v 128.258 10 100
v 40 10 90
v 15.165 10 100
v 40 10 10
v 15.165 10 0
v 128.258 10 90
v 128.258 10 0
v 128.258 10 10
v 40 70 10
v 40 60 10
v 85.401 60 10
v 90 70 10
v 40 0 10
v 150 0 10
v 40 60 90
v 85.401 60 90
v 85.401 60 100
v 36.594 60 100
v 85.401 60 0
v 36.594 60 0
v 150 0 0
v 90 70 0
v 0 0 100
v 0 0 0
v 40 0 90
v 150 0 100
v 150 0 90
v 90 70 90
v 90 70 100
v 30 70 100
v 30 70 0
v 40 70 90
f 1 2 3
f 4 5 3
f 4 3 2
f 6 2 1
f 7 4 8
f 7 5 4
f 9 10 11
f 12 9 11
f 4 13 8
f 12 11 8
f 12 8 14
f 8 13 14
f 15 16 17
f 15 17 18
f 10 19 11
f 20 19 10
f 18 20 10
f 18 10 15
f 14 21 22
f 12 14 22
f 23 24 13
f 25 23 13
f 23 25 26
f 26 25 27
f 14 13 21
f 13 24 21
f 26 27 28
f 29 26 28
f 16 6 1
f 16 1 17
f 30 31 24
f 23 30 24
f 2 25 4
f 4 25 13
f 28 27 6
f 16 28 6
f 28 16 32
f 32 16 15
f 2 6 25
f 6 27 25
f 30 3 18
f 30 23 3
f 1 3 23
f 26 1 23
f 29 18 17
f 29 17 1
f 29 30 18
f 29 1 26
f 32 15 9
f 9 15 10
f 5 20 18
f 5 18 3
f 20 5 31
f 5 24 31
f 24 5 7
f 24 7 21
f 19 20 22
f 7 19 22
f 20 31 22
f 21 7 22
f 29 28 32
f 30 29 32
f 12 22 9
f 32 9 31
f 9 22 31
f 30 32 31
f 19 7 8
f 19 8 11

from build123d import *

# Parameters (mm, degrees)
BOSS_EXTRUDE2_DEPTH          = 100
CUT_EXTRUDE_THIN5_DEPTH      = 194.390796058
CUT_EXTRUDE_THIN5_DEPTH_BACK = 100


with BuildPart() as part:
    # Sketch1 → Boss-Extrude2 (new body)
    with BuildSketch(Plane.XY):
        Polygon((0, 0), (150, 0), (90, 70), (30, 70), align=None)
        Polygon((36.59396158, 60), (15.165390151, 10), (128.257793632, 10), (85.400650775, 60), align=None, mode=Mode.SUBTRACT)
    extrude(amount=BOSS_EXTRUDE2_DEPTH)

    # Sketch10 → Cut-Extrude-Thin5 (cut, two sides: drawn at the far end of the back side and taken through both)
    with BuildSketch(Plane(origin=(0, 70, 0), x_dir=(1, 0, 0), z_dir=(0, 1, 0)).offset(-CUT_EXTRUDE_THIN5_DEPTH_BACK)):
        Polygon((150, -20), (50, -20), (50, -80), (150, -80), (150, -90), (40, -90), (40, -10), (150, -10), align=None)
    extrude(amount=CUT_EXTRUDE_THIN5_DEPTH + CUT_EXTRUDE_THIN5_DEPTH_BACK, mode=Mode.SUBTRACT)


with BuildPart() as body_2:
    # of the pieces the cut leaves, the one that is kept (cut_extrude_thin5_keep)
    add(part.part.solids().sort_by_distance((0, 0, 0))[0])


solid = body_2.part
